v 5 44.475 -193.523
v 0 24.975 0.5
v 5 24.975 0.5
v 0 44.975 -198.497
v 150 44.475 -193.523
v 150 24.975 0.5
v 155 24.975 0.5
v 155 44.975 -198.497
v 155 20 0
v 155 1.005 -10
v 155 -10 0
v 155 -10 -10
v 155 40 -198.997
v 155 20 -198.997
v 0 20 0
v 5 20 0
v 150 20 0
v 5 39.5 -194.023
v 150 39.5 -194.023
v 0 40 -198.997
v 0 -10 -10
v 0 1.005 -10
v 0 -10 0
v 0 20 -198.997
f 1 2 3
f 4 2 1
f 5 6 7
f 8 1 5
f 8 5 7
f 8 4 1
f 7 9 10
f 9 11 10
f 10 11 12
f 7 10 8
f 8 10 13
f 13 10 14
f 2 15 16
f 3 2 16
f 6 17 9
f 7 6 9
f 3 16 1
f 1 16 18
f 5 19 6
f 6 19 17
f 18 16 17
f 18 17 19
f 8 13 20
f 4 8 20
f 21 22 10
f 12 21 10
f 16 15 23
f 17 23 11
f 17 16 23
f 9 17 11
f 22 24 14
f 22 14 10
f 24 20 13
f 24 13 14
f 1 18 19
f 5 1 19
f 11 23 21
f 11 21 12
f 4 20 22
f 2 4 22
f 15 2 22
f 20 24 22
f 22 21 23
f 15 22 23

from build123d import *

# Parameters (mm, degrees)
BOSS_EXTRUDE1_DEPTH = 155
SKETCH7_W           = 155
SKETCH7_H           = 20
BOSS_EXTRUDE4_DEPTH = 10
SKETCH8_W           = 145
SKETCH8_H           = 5
BOSS_EXTRUDE5_DEPTH = 5


with BuildPart() as part:
    # Sketch4 → Boss-Extrude1 (new body)
    with BuildSketch(Plane(origin=(0, 0, 0), x_dir=(0, 0, -1), z_dir=(1, 0, 0))):
        Polygon((0, 0), (0, 20), (198.997487421, 40), (198.997487421, 20), align=None)
    extrude(amount=BOSS_EXTRUDE1_DEPTH)

    # Sketch7 → Boss-Extrude4 (add)
    with BuildSketch(Plane.XY):
        with Locations((77.5, 0)):
            Rectangle(SKETCH7_W, SKETCH7_H)
    extrude(amount=-BOSS_EXTRUDE4_DEPTH)

    # Sketch8 → Boss-Extrude5 (add)
    with BuildSketch(Plane(origin=(0, 19.8, 1.989974874), x_dir=(1, 0, 0), z_dir=(0, 0.994987437, 0.1))):
        Polygon((5, 202), (0, 202), (0, 2), (5, 2), (5, 197), align=None)
        with Locations((77.5, 199.5)):
            Rectangle(SKETCH8_W, SKETCH8_H)
        Polygon((155, 202), (150, 202), (150, 197), (150, 2), (155, 2), align=None)
    extrude(amount=BOSS_EXTRUDE5_DEPTH)


solid = part.part
